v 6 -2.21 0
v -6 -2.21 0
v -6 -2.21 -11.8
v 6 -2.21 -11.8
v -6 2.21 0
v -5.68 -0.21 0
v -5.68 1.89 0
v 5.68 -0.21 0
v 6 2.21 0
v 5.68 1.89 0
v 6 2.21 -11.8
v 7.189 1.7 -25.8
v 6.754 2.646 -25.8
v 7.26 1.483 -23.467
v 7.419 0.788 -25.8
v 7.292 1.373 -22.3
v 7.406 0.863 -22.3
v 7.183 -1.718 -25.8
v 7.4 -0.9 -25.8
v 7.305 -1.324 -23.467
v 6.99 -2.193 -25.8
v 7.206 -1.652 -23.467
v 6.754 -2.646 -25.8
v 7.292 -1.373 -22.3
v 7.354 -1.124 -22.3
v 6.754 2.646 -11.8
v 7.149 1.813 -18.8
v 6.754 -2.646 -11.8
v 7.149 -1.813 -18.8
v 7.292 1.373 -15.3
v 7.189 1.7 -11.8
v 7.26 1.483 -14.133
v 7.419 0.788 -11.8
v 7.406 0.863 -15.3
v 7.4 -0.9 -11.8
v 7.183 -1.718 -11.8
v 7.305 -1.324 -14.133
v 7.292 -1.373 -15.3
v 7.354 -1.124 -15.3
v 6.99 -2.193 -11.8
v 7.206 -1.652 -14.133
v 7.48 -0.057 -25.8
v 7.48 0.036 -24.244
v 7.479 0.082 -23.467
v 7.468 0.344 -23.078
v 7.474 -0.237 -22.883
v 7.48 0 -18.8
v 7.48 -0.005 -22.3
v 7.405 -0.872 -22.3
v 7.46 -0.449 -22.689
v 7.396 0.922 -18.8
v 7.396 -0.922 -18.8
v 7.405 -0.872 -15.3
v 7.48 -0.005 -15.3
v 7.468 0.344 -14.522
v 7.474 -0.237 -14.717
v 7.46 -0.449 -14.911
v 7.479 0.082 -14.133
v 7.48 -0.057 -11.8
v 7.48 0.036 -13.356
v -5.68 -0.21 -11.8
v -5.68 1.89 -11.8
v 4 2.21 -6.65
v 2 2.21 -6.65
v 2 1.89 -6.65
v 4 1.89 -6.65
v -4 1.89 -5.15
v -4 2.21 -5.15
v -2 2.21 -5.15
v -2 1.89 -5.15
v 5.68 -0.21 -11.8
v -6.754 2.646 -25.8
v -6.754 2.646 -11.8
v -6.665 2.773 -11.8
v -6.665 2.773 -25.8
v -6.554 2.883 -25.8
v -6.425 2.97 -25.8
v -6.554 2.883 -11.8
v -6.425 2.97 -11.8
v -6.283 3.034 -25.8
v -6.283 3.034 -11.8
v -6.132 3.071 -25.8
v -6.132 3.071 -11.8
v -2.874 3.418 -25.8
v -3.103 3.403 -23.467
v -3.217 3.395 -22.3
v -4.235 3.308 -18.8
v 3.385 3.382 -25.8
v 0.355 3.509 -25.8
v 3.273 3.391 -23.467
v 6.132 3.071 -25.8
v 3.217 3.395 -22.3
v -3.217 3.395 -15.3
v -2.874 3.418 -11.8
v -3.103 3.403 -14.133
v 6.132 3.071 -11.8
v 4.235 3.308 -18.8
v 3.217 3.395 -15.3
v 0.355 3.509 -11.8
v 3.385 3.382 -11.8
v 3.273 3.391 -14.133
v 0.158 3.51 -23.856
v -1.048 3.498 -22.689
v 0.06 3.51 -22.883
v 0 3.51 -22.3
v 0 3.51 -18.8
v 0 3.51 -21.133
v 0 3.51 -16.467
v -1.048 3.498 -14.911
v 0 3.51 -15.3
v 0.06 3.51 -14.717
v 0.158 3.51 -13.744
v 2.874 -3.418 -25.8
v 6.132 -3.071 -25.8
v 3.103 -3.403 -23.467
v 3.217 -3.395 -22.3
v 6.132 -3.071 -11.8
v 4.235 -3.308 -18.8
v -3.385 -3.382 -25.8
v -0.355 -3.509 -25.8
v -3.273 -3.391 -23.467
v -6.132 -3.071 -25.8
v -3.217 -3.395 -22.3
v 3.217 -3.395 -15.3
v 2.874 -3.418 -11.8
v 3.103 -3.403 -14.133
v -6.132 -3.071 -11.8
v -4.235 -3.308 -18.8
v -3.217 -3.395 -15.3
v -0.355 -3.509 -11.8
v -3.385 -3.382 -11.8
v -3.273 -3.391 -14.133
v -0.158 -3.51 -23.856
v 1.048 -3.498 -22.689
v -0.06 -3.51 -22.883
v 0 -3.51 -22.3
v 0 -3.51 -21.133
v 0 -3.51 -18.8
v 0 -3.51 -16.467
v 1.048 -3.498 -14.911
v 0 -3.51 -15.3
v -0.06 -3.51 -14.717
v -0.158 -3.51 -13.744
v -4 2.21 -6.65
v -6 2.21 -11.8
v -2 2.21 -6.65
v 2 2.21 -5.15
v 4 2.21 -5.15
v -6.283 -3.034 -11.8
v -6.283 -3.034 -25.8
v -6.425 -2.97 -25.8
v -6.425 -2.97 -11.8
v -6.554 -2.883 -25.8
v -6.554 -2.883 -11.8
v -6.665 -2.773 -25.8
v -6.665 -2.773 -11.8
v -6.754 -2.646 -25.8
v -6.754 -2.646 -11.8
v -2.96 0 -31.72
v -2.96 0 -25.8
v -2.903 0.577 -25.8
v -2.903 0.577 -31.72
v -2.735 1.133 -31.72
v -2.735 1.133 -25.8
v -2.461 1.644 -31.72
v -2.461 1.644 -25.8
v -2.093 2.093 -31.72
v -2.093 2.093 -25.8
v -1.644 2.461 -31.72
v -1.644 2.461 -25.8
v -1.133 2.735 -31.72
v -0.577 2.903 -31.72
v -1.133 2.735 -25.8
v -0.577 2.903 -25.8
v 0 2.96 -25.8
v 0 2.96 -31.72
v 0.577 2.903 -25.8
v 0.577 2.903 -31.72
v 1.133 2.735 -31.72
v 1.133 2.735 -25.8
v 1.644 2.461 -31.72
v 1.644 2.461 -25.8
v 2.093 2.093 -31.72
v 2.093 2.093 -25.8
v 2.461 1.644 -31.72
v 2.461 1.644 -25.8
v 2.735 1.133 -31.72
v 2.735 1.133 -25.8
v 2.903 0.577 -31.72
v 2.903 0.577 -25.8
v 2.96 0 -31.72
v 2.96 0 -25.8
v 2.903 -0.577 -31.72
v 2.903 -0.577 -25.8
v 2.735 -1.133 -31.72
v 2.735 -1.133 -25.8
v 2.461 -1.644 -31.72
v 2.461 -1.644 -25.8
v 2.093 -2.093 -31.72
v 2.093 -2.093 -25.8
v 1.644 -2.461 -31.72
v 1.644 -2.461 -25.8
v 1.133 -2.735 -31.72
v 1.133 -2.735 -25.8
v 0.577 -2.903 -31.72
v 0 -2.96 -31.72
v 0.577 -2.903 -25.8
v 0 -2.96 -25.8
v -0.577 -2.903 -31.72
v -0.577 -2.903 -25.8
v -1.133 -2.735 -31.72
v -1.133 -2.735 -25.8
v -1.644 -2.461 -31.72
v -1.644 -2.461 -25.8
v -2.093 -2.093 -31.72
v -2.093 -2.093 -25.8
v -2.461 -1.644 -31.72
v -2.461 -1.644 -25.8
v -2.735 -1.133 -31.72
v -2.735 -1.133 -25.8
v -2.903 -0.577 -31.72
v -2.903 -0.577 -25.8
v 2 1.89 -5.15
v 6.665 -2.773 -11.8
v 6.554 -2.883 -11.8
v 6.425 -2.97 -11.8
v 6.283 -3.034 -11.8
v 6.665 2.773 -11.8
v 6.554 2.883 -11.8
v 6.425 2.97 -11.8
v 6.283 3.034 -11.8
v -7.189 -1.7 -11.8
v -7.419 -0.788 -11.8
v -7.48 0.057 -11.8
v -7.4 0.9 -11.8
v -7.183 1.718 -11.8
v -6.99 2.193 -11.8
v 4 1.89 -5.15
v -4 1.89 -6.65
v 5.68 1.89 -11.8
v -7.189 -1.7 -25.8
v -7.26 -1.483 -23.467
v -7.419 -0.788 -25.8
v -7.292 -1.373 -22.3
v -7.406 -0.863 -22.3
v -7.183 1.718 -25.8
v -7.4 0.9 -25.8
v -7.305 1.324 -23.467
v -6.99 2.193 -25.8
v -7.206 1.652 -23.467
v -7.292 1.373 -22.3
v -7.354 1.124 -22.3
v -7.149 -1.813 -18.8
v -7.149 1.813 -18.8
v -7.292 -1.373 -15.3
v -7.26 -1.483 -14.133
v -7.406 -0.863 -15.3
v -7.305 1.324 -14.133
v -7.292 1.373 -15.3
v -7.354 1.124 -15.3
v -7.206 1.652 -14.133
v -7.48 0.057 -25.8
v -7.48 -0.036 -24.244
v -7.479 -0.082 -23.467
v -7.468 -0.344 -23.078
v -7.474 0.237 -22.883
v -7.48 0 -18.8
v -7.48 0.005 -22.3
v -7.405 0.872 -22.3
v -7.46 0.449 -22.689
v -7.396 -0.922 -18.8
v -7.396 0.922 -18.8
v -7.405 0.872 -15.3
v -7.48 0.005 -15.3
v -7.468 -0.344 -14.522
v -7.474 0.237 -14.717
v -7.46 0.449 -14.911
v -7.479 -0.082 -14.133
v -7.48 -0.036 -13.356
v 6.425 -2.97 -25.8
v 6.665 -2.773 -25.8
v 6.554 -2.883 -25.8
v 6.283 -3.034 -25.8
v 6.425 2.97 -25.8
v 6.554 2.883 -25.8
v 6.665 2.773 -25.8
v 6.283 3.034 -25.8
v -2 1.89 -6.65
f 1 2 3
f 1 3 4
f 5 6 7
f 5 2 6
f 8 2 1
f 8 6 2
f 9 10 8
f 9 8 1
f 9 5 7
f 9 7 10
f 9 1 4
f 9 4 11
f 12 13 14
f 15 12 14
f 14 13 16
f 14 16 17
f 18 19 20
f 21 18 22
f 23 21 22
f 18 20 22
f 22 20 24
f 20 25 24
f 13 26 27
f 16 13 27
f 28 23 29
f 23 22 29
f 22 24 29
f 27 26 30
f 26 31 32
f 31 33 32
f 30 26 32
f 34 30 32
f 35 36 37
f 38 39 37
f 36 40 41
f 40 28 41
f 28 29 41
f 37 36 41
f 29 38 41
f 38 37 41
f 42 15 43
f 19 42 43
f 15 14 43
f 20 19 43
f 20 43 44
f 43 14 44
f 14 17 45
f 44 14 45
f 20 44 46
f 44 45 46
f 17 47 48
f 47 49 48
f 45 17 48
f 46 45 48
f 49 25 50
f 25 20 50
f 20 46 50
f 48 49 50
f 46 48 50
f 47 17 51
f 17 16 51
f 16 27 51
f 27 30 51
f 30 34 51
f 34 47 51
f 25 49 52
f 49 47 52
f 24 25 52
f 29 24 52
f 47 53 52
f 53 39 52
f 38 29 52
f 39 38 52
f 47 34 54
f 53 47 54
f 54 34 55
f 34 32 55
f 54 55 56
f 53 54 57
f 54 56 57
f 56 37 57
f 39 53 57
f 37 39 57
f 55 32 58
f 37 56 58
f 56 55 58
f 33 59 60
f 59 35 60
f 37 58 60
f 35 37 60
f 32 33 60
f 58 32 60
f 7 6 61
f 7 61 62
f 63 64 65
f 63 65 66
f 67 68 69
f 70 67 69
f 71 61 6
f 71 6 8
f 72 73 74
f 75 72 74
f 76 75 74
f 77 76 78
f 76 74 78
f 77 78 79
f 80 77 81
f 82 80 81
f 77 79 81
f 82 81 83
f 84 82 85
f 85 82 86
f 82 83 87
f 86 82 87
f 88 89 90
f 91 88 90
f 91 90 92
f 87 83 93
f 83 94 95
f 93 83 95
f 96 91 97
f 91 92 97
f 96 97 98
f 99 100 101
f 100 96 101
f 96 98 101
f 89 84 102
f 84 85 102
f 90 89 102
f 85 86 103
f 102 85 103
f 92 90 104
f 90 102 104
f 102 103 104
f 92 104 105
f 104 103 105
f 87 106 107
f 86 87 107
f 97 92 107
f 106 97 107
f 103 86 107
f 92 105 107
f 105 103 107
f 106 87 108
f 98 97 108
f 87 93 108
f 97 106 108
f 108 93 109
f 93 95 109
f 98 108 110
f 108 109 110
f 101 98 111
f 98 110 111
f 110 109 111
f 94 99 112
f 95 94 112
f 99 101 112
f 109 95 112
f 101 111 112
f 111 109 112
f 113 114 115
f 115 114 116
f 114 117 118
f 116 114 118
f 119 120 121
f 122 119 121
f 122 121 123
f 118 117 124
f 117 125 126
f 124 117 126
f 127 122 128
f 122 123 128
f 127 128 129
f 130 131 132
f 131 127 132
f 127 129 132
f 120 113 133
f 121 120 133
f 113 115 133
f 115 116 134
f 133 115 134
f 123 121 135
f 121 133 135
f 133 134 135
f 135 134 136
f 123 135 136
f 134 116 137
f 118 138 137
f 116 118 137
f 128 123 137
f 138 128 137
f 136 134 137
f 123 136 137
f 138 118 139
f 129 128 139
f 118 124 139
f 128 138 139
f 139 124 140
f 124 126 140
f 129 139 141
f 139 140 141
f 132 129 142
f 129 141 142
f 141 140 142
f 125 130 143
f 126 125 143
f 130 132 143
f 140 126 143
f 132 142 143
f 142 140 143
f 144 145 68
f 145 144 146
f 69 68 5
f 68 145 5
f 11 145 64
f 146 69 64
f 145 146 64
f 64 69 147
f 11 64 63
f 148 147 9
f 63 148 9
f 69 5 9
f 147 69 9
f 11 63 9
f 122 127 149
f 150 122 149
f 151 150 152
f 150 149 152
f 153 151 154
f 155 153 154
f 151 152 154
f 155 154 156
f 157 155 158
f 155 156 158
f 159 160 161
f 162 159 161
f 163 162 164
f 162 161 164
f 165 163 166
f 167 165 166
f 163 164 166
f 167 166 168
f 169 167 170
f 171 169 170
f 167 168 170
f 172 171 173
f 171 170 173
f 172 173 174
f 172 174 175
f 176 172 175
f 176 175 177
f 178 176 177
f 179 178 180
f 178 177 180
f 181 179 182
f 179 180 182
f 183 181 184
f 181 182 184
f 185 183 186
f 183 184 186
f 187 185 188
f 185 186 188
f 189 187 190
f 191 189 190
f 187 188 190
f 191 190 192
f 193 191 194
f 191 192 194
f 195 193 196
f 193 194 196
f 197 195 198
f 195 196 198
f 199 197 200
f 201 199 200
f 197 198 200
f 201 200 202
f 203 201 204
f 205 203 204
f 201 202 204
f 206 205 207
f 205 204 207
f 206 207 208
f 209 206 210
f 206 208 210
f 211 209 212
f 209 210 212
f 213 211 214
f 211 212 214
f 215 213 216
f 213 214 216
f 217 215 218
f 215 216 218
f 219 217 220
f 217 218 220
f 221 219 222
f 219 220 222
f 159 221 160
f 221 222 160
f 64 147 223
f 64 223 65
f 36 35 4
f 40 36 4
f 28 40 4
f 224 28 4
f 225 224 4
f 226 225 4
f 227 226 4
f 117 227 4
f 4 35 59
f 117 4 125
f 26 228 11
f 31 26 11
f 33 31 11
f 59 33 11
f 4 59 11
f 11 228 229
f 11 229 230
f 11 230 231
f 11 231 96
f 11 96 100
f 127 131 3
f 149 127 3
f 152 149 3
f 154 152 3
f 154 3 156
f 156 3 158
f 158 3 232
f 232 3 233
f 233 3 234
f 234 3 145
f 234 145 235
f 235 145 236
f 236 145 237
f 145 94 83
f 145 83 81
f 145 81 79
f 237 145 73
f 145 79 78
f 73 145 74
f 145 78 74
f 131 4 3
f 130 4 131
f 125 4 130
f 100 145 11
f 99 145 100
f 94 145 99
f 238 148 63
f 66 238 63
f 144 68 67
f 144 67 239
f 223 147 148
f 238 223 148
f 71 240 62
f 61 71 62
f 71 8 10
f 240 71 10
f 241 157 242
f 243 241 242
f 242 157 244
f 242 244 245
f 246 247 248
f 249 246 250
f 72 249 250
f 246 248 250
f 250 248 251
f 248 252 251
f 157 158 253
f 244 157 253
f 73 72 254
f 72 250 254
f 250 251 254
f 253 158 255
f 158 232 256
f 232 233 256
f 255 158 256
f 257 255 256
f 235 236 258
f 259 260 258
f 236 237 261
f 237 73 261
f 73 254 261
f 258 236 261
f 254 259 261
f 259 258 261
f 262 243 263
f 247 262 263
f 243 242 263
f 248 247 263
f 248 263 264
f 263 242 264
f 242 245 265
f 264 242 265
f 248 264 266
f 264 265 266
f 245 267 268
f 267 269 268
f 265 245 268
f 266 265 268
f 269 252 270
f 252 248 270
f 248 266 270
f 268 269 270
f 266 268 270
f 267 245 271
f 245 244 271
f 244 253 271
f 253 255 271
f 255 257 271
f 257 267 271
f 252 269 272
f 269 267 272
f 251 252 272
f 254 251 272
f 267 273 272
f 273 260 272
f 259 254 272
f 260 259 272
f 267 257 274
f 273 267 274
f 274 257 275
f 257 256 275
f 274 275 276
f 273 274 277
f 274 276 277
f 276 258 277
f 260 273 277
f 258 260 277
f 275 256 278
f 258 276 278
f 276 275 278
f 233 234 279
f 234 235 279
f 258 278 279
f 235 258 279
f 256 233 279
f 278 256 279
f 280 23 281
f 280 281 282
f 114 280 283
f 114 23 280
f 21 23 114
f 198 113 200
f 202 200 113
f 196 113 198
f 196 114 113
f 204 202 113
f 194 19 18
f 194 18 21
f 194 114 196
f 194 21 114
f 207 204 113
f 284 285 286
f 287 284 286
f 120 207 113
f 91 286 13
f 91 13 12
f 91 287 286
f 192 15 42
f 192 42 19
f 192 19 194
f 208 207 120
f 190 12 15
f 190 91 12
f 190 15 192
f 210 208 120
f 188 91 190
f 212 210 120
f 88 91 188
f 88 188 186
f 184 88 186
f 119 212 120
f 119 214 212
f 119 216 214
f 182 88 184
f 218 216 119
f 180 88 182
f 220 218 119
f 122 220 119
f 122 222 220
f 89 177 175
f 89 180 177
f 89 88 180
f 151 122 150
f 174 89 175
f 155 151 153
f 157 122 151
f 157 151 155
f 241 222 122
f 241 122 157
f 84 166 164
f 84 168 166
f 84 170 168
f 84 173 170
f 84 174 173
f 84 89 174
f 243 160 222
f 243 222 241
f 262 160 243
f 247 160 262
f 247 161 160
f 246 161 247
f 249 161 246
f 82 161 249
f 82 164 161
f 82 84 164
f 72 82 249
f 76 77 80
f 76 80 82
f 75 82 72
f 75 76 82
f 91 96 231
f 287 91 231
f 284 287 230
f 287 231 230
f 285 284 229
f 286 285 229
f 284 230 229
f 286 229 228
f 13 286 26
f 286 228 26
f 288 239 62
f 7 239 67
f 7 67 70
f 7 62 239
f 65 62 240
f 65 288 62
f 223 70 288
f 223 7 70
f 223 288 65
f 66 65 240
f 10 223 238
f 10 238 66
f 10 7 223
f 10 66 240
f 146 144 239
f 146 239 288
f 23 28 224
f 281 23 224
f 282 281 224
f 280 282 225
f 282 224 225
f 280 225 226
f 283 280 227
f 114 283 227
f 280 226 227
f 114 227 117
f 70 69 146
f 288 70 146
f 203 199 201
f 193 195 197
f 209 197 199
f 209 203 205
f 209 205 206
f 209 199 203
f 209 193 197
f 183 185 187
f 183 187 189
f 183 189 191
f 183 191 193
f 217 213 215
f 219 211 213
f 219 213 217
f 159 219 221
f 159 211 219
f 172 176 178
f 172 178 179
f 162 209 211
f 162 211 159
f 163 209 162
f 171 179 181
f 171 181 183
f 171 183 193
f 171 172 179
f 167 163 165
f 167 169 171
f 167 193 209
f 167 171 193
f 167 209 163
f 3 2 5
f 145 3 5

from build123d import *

# Parameters (mm, degrees)
SKETCH1_W           = 12
SKETCH1_H           = 4.42
SKETCH1_W_2         = 11.36
SKETCH1_H_2         = 2.1
BOSS_EXTRUDE1_DEPTH = 11.8
BOSS_EXTRUDE3_DEPTH = 14
SKETCH3_R           = 2.96
BOSS_EXTRUDE4_DEPTH = 5.92
CUT_EXTRUDE1_REACH  = 35.088
SKETCH4_W           = 2
SKETCH4_H           = 1.5


with BuildPart() as part:
    # Sketch1 → Boss-Extrude1 (new body)
    with BuildSketch(Plane.XY):
        Rectangle(SKETCH1_W, SKETCH1_H)
        with Locations((0, 0.84)):
            Rectangle(SKETCH1_W_2, SKETCH1_H_2, mode=Mode.SUBTRACT)
    extrude(amount=-BOSS_EXTRUDE1_DEPTH)

    # Sketch2 → Boss-Extrude3 (add)
    with BuildSketch(Plane(origin=(0, 0, -11.8), x_dir=(-1, 0, 0), z_dir=(0, 0, -1))):
        with BuildLine():
            ThreePointArc((-6.132053571, 3.071220572), (-6.491568803, 2.929374125), (-6.754360741, 2.64598038))
            add(Edge.make_bspline(
                [(-6.754360741, 2.64598038), (-8.283596649, 0), (-6.754360741, -2.64598038)],
                knots=[5.839065971, 5.839065971, 5.839065971, 6.727304644, 6.727304644, 6.727304644], degree=2, weights=[1, 0.902989404, 1]))
            ThreePointArc((-6.754360741, -2.64598038), (-6.491568803, -2.929374125), (-6.132053571, -3.071220572))
            add(Edge.make_bspline(
                [(-6.132053571, -3.071220572), (0, -4.011467008), (6.132053571, -3.071220572)],
                knots=[1.065418499, 1.065418499, 1.065418499, 2.076174155, 2.076174155, 2.076174155], degree=2, weights=[1, 0.874991616, 1]))
            ThreePointArc((6.132053571, -3.071220572), (6.491568803, -2.929374125), (6.754360741, -2.64598038))
            add(Edge.make_bspline(
                [(6.754360741, -2.64598038), (8.283596649, 0), (6.754360741, 2.64598038)],
                knots=[2.697473317, 2.697473317, 2.697473317, 3.58571199, 3.58571199, 3.58571199], degree=2, weights=[1, 0.902989404, 1]))
            ThreePointArc((6.754360741, 2.64598038), (6.491568803, 2.929374125), (6.132053571, 3.071220572))
            add(Edge.make_bspline(
                [(6.132053571, 3.071220572), (0, 4.011467008), (-6.132053571, 3.071220572)],
                knots=[4.207011152, 4.207011152, 4.207011152, 5.217766808, 5.217766808, 5.217766808], degree=2, weights=[1, 0.874991616, 1]))
        make_face()
    extrude(amount=BOSS_EXTRUDE3_DEPTH)

    # Sketch3 → Boss-Extrude4 (add)
    with BuildSketch(Plane(origin=(0, 0, -25.8), x_dir=(-1, 0, 0), z_dir=(0, 0, -1))):
        Circle(SKETCH3_R)
    extrude(amount=BOSS_EXTRUDE4_DEPTH)

    # Sketch4 → Cut-Extrude1 (cut, up to next)
    with BuildSketch(Plane(origin=(0, 2.21, 0), x_dir=(1, 0, 0), z_dir=(0, 1, 0)), mode=Mode.PRIVATE) as cut_extrude1_sk1:
        with Locations((3, 5.9)):
            Rectangle(SKETCH4_W, SKETCH4_H)
    cut_extrude1_tool1 = extrude(cut_extrude1_sk1.sketch, amount=-CUT_EXTRUDE1_REACH, mode=Mode.PRIVATE) & part.part
    # Sketch4 → Cut-Extrude1 (cut, up to next)
    with BuildSketch(Plane(origin=(0, 2.21, 0), x_dir=(1, 0, 0), z_dir=(0, 1, 0)), mode=Mode.PRIVATE) as cut_extrude1_sk2:
        with Locations((-3, 5.9)):
            Rectangle(SKETCH4_W, SKETCH4_H)
    cut_extrude1_tool2 = extrude(cut_extrude1_sk2.sketch, amount=-CUT_EXTRUDE1_REACH, mode=Mode.PRIVATE) & part.part
    add(cut_extrude1_tool1.solids().sort_by_distance((3, 2.21, -5.9))[0], mode=Mode.SUBTRACT)
    add(cut_extrude1_tool2.solids().sort_by_distance((-3, 2.21, -5.9))[0], mode=Mode.SUBTRACT)


solid = part.part
